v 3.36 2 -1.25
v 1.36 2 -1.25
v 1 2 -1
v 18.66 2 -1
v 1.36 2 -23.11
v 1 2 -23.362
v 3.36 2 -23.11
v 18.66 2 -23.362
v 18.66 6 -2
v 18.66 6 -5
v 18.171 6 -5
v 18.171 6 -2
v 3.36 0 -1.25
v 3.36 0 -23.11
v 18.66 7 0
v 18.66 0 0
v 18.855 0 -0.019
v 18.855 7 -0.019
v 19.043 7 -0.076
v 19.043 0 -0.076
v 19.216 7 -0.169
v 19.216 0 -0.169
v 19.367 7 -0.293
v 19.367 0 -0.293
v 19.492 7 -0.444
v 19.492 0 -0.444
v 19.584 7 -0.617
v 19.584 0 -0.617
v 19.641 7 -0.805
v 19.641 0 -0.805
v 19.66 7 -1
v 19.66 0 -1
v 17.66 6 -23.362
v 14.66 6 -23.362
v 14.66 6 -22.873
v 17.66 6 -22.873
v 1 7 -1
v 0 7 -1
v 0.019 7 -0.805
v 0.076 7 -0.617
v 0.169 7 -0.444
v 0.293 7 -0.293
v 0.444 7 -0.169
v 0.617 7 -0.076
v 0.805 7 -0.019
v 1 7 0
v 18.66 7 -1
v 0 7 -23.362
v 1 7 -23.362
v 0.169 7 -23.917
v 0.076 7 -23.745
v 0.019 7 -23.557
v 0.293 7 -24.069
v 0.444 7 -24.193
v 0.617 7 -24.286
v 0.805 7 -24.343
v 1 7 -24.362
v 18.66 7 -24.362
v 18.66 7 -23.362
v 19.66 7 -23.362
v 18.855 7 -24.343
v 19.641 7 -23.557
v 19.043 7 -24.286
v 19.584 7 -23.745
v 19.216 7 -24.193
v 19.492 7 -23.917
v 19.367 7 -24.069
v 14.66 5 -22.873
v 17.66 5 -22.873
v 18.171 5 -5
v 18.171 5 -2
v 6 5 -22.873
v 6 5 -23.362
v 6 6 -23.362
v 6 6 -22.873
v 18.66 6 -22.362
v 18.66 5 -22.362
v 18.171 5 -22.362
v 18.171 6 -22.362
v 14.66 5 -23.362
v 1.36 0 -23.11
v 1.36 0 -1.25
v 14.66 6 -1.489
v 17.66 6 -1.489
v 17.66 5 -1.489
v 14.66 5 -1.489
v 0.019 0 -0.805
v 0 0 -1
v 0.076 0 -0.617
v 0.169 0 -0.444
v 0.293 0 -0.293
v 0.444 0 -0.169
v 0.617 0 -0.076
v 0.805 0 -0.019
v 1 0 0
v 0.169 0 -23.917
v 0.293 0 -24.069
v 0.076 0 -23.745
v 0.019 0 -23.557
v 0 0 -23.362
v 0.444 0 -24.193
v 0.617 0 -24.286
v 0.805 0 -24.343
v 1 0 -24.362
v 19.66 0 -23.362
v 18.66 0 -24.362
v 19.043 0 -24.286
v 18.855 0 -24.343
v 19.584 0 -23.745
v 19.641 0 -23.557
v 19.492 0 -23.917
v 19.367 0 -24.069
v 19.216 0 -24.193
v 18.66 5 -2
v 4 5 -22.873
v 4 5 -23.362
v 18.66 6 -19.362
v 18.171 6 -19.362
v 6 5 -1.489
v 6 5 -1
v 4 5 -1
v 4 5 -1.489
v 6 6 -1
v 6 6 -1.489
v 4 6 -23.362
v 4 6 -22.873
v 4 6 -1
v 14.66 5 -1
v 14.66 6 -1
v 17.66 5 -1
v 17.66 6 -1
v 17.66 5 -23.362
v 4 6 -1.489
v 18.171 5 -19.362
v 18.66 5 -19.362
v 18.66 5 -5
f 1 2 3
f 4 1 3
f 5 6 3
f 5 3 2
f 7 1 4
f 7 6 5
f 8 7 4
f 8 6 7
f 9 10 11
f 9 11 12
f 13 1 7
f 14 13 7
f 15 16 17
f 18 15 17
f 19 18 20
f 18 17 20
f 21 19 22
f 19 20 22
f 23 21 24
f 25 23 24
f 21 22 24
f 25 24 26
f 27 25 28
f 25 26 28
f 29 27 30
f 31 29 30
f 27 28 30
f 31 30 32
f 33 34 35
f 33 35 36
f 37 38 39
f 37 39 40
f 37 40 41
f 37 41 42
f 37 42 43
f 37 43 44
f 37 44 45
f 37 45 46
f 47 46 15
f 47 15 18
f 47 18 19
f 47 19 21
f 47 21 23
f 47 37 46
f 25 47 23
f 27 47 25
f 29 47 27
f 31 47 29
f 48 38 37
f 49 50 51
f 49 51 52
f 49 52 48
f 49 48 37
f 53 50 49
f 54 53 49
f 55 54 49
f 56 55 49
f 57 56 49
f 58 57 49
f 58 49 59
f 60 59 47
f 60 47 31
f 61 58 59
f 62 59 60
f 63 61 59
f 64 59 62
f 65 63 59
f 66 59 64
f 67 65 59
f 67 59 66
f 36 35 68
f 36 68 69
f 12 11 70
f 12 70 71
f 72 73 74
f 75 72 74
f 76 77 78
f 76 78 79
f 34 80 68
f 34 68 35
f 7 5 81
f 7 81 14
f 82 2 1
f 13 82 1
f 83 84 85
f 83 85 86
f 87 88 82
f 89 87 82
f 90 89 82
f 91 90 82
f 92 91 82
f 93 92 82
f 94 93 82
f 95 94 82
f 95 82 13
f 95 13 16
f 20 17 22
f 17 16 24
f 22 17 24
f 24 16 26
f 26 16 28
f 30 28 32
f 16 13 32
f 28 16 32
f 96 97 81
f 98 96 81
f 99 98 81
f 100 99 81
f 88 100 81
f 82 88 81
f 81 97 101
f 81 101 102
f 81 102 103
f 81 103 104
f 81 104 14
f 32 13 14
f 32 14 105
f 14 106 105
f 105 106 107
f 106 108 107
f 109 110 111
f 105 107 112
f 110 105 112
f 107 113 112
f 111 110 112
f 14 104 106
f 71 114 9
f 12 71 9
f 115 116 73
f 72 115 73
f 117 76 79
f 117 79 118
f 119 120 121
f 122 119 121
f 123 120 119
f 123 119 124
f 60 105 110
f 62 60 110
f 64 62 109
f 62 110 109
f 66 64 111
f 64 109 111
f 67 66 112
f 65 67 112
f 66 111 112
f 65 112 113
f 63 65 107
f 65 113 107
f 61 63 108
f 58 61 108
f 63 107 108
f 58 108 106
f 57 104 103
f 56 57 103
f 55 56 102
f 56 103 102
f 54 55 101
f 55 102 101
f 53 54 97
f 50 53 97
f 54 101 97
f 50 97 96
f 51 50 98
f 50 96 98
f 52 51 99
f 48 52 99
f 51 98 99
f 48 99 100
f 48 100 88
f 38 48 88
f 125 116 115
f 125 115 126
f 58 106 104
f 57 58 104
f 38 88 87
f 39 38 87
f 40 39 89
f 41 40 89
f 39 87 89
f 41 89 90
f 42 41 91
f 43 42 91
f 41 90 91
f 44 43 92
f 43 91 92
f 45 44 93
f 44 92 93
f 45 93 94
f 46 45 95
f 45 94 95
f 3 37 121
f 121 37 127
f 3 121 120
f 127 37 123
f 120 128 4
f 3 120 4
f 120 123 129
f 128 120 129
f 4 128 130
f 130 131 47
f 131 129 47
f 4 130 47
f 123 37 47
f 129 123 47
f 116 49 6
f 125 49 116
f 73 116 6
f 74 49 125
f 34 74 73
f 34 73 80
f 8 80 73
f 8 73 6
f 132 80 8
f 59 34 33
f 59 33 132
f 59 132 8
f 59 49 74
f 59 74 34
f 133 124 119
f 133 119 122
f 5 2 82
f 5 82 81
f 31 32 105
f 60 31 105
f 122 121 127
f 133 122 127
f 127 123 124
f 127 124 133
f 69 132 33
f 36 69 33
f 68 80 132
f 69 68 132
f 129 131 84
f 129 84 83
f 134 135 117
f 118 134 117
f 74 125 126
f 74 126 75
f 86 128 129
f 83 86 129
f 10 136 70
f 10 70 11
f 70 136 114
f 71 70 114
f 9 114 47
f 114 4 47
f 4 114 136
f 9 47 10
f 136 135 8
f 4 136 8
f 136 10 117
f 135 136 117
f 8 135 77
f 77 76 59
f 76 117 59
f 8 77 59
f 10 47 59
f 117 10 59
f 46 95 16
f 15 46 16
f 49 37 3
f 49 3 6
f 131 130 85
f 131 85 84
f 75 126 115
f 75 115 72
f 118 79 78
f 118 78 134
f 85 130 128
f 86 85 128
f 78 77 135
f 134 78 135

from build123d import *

# Parameters (mm, degrees)
BOSS_EXTRU_1_DEPTH      = 7
ESQUISSE2_W             = 17.66012
ESQUISSE2_H             = 22.36185
ENL_V_MAT_EXTRU_1_DEPTH = 5
ESQUISSE5_W             = 2
ESQUISSE5_H             = 21.86
ENL_V_MAT_EXTRU_3_DEPTH = 32.702051256
ESQUISSE6_W             = 3
ESQUISSE6_H             = 1
BOSS_EXTRU_2_DEPTH      = 0.48904
ESQUISSE7_W             = 3
ESQUISSE7_H             = 1
BOSS_EXTRU_3_DEPTH      = 0.48904
ESQUISSE8_W             = 3
ESQUISSE8_H             = 1
BOSS_EXTRU_4_DEPTH      = 0.48904
ESQUISSE9_W             = 3
ESQUISSE9_H             = 1
BOSS_EXTRU_5_DEPTH      = 0.48904
ESQUISSE10_W            = 2
ESQUISSE10_H            = 1
BOSS_EXTRU_6_DEPTH      = 0.48904
ESQUISSE11_W            = 2
ESQUISSE11_H            = 1
BOSS_EXTRU_7_DEPTH      = 0.48904


with BuildPart() as part:
    # Esquisse1 → Boss.-Extru.1 (new body)
    with BuildSketch(Plane(origin=(0, 0, 0), x_dir=(1, 0, 0), z_dir=(0, 1, 0))):
        with BuildLine():
            Line((1, 0), (18.66012, 0))
            ThreePointArc((18.66012, 0), (19.367226781, 0.292893219), (19.66012, 1))
            Line((19.66012, 1), (19.66012, 23.36185))
            ThreePointArc((19.66012, 23.36185), (19.367226781, 24.068956781), (18.66012, 24.36185))
            Line((18.66012, 24.36185), (1, 24.36185))
            ThreePointArc((1, 24.36185), (0.292893219, 24.068956781), (0, 23.36185))
            Line((0, 23.36185), (0, 1))
            ThreePointArc((0, 1), (0.292893219, 0.292893219), (1, 0))
        make_face()
    extrude(amount=BOSS_EXTRU_1_DEPTH)

    # Esquisse2 → Enlèv. mat.-Extru.1 (cut)
    with BuildSketch(Plane(origin=(0, 7, 0), x_dir=(1, 0, 0), z_dir=(0, 1, 0))):
        with Locations((9.83006, 12.180925)):
            Rectangle(ESQUISSE2_W, ESQUISSE2_H)
    extrude(amount=-ENL_V_MAT_EXTRU_1_DEPTH, mode=Mode.SUBTRACT)

    # Esquisse5 → Enlèv. mat.-Extru.3 (cut, through all)
    with BuildSketch(Plane(origin=(0, 2, 0), x_dir=(1, 0, 0), z_dir=(0, 1, 0))):
        with Locations((2.36, 12.18)):
            Rectangle(ESQUISSE5_W, ESQUISSE5_H)
    extrude(amount=-ENL_V_MAT_EXTRU_3_DEPTH, mode=Mode.SUBTRACT)

    # Esquisse6 → Boss.-Extru.2 (add)
    with BuildSketch(Plane.XY.offset(-23.36185)):
        with Locations((16.16012, 5.5)):
            Rectangle(ESQUISSE6_W, ESQUISSE6_H)
    extrude(amount=BOSS_EXTRU_2_DEPTH)

    # Esquisse7 → Boss.-Extru.3 (add)
    with BuildSketch(Plane.ZY.offset(-18.66012)):
        with Locations((-20.86185, 5.5)):
            Rectangle(ESQUISSE7_W, ESQUISSE7_H)
    extrude(amount=BOSS_EXTRU_3_DEPTH)

    # Esquisse8 → Boss.-Extru.4 (add)
    with BuildSketch(Plane(origin=(0, 0, -1), x_dir=(-1, 0, 0), z_dir=(0, 0, -1))):
        with Locations((-16.16012, 5.5)):
            Rectangle(ESQUISSE8_W, ESQUISSE8_H)
    extrude(amount=BOSS_EXTRU_4_DEPTH)

    # Esquisse9 → Boss.-Extru.5 (add)
    with BuildSketch(Plane.ZY.offset(-18.66012)):
        with Locations((-3.5, 5.5)):
            Rectangle(ESQUISSE9_W, ESQUISSE9_H)
    extrude(amount=BOSS_EXTRU_5_DEPTH)

    # Esquisse10 → Boss.-Extru.6 (add)
    with BuildSketch(Plane.XY.offset(-23.36185)):
        with Locations((5, 5.5)):
            Rectangle(ESQUISSE10_W, ESQUISSE10_H)
    extrude(amount=BOSS_EXTRU_6_DEPTH)

    # Esquisse11 → Boss.-Extru.7 (add)
    with BuildSketch(Plane(origin=(0, 0, -1), x_dir=(-1, 0, 0), z_dir=(0, 0, -1))):
        with Locations((-5, 5.5)):
            Rectangle(ESQUISSE11_W, ESQUISSE11_H)
    extrude(amount=BOSS_EXTRU_7_DEPTH)


solid = part.part
